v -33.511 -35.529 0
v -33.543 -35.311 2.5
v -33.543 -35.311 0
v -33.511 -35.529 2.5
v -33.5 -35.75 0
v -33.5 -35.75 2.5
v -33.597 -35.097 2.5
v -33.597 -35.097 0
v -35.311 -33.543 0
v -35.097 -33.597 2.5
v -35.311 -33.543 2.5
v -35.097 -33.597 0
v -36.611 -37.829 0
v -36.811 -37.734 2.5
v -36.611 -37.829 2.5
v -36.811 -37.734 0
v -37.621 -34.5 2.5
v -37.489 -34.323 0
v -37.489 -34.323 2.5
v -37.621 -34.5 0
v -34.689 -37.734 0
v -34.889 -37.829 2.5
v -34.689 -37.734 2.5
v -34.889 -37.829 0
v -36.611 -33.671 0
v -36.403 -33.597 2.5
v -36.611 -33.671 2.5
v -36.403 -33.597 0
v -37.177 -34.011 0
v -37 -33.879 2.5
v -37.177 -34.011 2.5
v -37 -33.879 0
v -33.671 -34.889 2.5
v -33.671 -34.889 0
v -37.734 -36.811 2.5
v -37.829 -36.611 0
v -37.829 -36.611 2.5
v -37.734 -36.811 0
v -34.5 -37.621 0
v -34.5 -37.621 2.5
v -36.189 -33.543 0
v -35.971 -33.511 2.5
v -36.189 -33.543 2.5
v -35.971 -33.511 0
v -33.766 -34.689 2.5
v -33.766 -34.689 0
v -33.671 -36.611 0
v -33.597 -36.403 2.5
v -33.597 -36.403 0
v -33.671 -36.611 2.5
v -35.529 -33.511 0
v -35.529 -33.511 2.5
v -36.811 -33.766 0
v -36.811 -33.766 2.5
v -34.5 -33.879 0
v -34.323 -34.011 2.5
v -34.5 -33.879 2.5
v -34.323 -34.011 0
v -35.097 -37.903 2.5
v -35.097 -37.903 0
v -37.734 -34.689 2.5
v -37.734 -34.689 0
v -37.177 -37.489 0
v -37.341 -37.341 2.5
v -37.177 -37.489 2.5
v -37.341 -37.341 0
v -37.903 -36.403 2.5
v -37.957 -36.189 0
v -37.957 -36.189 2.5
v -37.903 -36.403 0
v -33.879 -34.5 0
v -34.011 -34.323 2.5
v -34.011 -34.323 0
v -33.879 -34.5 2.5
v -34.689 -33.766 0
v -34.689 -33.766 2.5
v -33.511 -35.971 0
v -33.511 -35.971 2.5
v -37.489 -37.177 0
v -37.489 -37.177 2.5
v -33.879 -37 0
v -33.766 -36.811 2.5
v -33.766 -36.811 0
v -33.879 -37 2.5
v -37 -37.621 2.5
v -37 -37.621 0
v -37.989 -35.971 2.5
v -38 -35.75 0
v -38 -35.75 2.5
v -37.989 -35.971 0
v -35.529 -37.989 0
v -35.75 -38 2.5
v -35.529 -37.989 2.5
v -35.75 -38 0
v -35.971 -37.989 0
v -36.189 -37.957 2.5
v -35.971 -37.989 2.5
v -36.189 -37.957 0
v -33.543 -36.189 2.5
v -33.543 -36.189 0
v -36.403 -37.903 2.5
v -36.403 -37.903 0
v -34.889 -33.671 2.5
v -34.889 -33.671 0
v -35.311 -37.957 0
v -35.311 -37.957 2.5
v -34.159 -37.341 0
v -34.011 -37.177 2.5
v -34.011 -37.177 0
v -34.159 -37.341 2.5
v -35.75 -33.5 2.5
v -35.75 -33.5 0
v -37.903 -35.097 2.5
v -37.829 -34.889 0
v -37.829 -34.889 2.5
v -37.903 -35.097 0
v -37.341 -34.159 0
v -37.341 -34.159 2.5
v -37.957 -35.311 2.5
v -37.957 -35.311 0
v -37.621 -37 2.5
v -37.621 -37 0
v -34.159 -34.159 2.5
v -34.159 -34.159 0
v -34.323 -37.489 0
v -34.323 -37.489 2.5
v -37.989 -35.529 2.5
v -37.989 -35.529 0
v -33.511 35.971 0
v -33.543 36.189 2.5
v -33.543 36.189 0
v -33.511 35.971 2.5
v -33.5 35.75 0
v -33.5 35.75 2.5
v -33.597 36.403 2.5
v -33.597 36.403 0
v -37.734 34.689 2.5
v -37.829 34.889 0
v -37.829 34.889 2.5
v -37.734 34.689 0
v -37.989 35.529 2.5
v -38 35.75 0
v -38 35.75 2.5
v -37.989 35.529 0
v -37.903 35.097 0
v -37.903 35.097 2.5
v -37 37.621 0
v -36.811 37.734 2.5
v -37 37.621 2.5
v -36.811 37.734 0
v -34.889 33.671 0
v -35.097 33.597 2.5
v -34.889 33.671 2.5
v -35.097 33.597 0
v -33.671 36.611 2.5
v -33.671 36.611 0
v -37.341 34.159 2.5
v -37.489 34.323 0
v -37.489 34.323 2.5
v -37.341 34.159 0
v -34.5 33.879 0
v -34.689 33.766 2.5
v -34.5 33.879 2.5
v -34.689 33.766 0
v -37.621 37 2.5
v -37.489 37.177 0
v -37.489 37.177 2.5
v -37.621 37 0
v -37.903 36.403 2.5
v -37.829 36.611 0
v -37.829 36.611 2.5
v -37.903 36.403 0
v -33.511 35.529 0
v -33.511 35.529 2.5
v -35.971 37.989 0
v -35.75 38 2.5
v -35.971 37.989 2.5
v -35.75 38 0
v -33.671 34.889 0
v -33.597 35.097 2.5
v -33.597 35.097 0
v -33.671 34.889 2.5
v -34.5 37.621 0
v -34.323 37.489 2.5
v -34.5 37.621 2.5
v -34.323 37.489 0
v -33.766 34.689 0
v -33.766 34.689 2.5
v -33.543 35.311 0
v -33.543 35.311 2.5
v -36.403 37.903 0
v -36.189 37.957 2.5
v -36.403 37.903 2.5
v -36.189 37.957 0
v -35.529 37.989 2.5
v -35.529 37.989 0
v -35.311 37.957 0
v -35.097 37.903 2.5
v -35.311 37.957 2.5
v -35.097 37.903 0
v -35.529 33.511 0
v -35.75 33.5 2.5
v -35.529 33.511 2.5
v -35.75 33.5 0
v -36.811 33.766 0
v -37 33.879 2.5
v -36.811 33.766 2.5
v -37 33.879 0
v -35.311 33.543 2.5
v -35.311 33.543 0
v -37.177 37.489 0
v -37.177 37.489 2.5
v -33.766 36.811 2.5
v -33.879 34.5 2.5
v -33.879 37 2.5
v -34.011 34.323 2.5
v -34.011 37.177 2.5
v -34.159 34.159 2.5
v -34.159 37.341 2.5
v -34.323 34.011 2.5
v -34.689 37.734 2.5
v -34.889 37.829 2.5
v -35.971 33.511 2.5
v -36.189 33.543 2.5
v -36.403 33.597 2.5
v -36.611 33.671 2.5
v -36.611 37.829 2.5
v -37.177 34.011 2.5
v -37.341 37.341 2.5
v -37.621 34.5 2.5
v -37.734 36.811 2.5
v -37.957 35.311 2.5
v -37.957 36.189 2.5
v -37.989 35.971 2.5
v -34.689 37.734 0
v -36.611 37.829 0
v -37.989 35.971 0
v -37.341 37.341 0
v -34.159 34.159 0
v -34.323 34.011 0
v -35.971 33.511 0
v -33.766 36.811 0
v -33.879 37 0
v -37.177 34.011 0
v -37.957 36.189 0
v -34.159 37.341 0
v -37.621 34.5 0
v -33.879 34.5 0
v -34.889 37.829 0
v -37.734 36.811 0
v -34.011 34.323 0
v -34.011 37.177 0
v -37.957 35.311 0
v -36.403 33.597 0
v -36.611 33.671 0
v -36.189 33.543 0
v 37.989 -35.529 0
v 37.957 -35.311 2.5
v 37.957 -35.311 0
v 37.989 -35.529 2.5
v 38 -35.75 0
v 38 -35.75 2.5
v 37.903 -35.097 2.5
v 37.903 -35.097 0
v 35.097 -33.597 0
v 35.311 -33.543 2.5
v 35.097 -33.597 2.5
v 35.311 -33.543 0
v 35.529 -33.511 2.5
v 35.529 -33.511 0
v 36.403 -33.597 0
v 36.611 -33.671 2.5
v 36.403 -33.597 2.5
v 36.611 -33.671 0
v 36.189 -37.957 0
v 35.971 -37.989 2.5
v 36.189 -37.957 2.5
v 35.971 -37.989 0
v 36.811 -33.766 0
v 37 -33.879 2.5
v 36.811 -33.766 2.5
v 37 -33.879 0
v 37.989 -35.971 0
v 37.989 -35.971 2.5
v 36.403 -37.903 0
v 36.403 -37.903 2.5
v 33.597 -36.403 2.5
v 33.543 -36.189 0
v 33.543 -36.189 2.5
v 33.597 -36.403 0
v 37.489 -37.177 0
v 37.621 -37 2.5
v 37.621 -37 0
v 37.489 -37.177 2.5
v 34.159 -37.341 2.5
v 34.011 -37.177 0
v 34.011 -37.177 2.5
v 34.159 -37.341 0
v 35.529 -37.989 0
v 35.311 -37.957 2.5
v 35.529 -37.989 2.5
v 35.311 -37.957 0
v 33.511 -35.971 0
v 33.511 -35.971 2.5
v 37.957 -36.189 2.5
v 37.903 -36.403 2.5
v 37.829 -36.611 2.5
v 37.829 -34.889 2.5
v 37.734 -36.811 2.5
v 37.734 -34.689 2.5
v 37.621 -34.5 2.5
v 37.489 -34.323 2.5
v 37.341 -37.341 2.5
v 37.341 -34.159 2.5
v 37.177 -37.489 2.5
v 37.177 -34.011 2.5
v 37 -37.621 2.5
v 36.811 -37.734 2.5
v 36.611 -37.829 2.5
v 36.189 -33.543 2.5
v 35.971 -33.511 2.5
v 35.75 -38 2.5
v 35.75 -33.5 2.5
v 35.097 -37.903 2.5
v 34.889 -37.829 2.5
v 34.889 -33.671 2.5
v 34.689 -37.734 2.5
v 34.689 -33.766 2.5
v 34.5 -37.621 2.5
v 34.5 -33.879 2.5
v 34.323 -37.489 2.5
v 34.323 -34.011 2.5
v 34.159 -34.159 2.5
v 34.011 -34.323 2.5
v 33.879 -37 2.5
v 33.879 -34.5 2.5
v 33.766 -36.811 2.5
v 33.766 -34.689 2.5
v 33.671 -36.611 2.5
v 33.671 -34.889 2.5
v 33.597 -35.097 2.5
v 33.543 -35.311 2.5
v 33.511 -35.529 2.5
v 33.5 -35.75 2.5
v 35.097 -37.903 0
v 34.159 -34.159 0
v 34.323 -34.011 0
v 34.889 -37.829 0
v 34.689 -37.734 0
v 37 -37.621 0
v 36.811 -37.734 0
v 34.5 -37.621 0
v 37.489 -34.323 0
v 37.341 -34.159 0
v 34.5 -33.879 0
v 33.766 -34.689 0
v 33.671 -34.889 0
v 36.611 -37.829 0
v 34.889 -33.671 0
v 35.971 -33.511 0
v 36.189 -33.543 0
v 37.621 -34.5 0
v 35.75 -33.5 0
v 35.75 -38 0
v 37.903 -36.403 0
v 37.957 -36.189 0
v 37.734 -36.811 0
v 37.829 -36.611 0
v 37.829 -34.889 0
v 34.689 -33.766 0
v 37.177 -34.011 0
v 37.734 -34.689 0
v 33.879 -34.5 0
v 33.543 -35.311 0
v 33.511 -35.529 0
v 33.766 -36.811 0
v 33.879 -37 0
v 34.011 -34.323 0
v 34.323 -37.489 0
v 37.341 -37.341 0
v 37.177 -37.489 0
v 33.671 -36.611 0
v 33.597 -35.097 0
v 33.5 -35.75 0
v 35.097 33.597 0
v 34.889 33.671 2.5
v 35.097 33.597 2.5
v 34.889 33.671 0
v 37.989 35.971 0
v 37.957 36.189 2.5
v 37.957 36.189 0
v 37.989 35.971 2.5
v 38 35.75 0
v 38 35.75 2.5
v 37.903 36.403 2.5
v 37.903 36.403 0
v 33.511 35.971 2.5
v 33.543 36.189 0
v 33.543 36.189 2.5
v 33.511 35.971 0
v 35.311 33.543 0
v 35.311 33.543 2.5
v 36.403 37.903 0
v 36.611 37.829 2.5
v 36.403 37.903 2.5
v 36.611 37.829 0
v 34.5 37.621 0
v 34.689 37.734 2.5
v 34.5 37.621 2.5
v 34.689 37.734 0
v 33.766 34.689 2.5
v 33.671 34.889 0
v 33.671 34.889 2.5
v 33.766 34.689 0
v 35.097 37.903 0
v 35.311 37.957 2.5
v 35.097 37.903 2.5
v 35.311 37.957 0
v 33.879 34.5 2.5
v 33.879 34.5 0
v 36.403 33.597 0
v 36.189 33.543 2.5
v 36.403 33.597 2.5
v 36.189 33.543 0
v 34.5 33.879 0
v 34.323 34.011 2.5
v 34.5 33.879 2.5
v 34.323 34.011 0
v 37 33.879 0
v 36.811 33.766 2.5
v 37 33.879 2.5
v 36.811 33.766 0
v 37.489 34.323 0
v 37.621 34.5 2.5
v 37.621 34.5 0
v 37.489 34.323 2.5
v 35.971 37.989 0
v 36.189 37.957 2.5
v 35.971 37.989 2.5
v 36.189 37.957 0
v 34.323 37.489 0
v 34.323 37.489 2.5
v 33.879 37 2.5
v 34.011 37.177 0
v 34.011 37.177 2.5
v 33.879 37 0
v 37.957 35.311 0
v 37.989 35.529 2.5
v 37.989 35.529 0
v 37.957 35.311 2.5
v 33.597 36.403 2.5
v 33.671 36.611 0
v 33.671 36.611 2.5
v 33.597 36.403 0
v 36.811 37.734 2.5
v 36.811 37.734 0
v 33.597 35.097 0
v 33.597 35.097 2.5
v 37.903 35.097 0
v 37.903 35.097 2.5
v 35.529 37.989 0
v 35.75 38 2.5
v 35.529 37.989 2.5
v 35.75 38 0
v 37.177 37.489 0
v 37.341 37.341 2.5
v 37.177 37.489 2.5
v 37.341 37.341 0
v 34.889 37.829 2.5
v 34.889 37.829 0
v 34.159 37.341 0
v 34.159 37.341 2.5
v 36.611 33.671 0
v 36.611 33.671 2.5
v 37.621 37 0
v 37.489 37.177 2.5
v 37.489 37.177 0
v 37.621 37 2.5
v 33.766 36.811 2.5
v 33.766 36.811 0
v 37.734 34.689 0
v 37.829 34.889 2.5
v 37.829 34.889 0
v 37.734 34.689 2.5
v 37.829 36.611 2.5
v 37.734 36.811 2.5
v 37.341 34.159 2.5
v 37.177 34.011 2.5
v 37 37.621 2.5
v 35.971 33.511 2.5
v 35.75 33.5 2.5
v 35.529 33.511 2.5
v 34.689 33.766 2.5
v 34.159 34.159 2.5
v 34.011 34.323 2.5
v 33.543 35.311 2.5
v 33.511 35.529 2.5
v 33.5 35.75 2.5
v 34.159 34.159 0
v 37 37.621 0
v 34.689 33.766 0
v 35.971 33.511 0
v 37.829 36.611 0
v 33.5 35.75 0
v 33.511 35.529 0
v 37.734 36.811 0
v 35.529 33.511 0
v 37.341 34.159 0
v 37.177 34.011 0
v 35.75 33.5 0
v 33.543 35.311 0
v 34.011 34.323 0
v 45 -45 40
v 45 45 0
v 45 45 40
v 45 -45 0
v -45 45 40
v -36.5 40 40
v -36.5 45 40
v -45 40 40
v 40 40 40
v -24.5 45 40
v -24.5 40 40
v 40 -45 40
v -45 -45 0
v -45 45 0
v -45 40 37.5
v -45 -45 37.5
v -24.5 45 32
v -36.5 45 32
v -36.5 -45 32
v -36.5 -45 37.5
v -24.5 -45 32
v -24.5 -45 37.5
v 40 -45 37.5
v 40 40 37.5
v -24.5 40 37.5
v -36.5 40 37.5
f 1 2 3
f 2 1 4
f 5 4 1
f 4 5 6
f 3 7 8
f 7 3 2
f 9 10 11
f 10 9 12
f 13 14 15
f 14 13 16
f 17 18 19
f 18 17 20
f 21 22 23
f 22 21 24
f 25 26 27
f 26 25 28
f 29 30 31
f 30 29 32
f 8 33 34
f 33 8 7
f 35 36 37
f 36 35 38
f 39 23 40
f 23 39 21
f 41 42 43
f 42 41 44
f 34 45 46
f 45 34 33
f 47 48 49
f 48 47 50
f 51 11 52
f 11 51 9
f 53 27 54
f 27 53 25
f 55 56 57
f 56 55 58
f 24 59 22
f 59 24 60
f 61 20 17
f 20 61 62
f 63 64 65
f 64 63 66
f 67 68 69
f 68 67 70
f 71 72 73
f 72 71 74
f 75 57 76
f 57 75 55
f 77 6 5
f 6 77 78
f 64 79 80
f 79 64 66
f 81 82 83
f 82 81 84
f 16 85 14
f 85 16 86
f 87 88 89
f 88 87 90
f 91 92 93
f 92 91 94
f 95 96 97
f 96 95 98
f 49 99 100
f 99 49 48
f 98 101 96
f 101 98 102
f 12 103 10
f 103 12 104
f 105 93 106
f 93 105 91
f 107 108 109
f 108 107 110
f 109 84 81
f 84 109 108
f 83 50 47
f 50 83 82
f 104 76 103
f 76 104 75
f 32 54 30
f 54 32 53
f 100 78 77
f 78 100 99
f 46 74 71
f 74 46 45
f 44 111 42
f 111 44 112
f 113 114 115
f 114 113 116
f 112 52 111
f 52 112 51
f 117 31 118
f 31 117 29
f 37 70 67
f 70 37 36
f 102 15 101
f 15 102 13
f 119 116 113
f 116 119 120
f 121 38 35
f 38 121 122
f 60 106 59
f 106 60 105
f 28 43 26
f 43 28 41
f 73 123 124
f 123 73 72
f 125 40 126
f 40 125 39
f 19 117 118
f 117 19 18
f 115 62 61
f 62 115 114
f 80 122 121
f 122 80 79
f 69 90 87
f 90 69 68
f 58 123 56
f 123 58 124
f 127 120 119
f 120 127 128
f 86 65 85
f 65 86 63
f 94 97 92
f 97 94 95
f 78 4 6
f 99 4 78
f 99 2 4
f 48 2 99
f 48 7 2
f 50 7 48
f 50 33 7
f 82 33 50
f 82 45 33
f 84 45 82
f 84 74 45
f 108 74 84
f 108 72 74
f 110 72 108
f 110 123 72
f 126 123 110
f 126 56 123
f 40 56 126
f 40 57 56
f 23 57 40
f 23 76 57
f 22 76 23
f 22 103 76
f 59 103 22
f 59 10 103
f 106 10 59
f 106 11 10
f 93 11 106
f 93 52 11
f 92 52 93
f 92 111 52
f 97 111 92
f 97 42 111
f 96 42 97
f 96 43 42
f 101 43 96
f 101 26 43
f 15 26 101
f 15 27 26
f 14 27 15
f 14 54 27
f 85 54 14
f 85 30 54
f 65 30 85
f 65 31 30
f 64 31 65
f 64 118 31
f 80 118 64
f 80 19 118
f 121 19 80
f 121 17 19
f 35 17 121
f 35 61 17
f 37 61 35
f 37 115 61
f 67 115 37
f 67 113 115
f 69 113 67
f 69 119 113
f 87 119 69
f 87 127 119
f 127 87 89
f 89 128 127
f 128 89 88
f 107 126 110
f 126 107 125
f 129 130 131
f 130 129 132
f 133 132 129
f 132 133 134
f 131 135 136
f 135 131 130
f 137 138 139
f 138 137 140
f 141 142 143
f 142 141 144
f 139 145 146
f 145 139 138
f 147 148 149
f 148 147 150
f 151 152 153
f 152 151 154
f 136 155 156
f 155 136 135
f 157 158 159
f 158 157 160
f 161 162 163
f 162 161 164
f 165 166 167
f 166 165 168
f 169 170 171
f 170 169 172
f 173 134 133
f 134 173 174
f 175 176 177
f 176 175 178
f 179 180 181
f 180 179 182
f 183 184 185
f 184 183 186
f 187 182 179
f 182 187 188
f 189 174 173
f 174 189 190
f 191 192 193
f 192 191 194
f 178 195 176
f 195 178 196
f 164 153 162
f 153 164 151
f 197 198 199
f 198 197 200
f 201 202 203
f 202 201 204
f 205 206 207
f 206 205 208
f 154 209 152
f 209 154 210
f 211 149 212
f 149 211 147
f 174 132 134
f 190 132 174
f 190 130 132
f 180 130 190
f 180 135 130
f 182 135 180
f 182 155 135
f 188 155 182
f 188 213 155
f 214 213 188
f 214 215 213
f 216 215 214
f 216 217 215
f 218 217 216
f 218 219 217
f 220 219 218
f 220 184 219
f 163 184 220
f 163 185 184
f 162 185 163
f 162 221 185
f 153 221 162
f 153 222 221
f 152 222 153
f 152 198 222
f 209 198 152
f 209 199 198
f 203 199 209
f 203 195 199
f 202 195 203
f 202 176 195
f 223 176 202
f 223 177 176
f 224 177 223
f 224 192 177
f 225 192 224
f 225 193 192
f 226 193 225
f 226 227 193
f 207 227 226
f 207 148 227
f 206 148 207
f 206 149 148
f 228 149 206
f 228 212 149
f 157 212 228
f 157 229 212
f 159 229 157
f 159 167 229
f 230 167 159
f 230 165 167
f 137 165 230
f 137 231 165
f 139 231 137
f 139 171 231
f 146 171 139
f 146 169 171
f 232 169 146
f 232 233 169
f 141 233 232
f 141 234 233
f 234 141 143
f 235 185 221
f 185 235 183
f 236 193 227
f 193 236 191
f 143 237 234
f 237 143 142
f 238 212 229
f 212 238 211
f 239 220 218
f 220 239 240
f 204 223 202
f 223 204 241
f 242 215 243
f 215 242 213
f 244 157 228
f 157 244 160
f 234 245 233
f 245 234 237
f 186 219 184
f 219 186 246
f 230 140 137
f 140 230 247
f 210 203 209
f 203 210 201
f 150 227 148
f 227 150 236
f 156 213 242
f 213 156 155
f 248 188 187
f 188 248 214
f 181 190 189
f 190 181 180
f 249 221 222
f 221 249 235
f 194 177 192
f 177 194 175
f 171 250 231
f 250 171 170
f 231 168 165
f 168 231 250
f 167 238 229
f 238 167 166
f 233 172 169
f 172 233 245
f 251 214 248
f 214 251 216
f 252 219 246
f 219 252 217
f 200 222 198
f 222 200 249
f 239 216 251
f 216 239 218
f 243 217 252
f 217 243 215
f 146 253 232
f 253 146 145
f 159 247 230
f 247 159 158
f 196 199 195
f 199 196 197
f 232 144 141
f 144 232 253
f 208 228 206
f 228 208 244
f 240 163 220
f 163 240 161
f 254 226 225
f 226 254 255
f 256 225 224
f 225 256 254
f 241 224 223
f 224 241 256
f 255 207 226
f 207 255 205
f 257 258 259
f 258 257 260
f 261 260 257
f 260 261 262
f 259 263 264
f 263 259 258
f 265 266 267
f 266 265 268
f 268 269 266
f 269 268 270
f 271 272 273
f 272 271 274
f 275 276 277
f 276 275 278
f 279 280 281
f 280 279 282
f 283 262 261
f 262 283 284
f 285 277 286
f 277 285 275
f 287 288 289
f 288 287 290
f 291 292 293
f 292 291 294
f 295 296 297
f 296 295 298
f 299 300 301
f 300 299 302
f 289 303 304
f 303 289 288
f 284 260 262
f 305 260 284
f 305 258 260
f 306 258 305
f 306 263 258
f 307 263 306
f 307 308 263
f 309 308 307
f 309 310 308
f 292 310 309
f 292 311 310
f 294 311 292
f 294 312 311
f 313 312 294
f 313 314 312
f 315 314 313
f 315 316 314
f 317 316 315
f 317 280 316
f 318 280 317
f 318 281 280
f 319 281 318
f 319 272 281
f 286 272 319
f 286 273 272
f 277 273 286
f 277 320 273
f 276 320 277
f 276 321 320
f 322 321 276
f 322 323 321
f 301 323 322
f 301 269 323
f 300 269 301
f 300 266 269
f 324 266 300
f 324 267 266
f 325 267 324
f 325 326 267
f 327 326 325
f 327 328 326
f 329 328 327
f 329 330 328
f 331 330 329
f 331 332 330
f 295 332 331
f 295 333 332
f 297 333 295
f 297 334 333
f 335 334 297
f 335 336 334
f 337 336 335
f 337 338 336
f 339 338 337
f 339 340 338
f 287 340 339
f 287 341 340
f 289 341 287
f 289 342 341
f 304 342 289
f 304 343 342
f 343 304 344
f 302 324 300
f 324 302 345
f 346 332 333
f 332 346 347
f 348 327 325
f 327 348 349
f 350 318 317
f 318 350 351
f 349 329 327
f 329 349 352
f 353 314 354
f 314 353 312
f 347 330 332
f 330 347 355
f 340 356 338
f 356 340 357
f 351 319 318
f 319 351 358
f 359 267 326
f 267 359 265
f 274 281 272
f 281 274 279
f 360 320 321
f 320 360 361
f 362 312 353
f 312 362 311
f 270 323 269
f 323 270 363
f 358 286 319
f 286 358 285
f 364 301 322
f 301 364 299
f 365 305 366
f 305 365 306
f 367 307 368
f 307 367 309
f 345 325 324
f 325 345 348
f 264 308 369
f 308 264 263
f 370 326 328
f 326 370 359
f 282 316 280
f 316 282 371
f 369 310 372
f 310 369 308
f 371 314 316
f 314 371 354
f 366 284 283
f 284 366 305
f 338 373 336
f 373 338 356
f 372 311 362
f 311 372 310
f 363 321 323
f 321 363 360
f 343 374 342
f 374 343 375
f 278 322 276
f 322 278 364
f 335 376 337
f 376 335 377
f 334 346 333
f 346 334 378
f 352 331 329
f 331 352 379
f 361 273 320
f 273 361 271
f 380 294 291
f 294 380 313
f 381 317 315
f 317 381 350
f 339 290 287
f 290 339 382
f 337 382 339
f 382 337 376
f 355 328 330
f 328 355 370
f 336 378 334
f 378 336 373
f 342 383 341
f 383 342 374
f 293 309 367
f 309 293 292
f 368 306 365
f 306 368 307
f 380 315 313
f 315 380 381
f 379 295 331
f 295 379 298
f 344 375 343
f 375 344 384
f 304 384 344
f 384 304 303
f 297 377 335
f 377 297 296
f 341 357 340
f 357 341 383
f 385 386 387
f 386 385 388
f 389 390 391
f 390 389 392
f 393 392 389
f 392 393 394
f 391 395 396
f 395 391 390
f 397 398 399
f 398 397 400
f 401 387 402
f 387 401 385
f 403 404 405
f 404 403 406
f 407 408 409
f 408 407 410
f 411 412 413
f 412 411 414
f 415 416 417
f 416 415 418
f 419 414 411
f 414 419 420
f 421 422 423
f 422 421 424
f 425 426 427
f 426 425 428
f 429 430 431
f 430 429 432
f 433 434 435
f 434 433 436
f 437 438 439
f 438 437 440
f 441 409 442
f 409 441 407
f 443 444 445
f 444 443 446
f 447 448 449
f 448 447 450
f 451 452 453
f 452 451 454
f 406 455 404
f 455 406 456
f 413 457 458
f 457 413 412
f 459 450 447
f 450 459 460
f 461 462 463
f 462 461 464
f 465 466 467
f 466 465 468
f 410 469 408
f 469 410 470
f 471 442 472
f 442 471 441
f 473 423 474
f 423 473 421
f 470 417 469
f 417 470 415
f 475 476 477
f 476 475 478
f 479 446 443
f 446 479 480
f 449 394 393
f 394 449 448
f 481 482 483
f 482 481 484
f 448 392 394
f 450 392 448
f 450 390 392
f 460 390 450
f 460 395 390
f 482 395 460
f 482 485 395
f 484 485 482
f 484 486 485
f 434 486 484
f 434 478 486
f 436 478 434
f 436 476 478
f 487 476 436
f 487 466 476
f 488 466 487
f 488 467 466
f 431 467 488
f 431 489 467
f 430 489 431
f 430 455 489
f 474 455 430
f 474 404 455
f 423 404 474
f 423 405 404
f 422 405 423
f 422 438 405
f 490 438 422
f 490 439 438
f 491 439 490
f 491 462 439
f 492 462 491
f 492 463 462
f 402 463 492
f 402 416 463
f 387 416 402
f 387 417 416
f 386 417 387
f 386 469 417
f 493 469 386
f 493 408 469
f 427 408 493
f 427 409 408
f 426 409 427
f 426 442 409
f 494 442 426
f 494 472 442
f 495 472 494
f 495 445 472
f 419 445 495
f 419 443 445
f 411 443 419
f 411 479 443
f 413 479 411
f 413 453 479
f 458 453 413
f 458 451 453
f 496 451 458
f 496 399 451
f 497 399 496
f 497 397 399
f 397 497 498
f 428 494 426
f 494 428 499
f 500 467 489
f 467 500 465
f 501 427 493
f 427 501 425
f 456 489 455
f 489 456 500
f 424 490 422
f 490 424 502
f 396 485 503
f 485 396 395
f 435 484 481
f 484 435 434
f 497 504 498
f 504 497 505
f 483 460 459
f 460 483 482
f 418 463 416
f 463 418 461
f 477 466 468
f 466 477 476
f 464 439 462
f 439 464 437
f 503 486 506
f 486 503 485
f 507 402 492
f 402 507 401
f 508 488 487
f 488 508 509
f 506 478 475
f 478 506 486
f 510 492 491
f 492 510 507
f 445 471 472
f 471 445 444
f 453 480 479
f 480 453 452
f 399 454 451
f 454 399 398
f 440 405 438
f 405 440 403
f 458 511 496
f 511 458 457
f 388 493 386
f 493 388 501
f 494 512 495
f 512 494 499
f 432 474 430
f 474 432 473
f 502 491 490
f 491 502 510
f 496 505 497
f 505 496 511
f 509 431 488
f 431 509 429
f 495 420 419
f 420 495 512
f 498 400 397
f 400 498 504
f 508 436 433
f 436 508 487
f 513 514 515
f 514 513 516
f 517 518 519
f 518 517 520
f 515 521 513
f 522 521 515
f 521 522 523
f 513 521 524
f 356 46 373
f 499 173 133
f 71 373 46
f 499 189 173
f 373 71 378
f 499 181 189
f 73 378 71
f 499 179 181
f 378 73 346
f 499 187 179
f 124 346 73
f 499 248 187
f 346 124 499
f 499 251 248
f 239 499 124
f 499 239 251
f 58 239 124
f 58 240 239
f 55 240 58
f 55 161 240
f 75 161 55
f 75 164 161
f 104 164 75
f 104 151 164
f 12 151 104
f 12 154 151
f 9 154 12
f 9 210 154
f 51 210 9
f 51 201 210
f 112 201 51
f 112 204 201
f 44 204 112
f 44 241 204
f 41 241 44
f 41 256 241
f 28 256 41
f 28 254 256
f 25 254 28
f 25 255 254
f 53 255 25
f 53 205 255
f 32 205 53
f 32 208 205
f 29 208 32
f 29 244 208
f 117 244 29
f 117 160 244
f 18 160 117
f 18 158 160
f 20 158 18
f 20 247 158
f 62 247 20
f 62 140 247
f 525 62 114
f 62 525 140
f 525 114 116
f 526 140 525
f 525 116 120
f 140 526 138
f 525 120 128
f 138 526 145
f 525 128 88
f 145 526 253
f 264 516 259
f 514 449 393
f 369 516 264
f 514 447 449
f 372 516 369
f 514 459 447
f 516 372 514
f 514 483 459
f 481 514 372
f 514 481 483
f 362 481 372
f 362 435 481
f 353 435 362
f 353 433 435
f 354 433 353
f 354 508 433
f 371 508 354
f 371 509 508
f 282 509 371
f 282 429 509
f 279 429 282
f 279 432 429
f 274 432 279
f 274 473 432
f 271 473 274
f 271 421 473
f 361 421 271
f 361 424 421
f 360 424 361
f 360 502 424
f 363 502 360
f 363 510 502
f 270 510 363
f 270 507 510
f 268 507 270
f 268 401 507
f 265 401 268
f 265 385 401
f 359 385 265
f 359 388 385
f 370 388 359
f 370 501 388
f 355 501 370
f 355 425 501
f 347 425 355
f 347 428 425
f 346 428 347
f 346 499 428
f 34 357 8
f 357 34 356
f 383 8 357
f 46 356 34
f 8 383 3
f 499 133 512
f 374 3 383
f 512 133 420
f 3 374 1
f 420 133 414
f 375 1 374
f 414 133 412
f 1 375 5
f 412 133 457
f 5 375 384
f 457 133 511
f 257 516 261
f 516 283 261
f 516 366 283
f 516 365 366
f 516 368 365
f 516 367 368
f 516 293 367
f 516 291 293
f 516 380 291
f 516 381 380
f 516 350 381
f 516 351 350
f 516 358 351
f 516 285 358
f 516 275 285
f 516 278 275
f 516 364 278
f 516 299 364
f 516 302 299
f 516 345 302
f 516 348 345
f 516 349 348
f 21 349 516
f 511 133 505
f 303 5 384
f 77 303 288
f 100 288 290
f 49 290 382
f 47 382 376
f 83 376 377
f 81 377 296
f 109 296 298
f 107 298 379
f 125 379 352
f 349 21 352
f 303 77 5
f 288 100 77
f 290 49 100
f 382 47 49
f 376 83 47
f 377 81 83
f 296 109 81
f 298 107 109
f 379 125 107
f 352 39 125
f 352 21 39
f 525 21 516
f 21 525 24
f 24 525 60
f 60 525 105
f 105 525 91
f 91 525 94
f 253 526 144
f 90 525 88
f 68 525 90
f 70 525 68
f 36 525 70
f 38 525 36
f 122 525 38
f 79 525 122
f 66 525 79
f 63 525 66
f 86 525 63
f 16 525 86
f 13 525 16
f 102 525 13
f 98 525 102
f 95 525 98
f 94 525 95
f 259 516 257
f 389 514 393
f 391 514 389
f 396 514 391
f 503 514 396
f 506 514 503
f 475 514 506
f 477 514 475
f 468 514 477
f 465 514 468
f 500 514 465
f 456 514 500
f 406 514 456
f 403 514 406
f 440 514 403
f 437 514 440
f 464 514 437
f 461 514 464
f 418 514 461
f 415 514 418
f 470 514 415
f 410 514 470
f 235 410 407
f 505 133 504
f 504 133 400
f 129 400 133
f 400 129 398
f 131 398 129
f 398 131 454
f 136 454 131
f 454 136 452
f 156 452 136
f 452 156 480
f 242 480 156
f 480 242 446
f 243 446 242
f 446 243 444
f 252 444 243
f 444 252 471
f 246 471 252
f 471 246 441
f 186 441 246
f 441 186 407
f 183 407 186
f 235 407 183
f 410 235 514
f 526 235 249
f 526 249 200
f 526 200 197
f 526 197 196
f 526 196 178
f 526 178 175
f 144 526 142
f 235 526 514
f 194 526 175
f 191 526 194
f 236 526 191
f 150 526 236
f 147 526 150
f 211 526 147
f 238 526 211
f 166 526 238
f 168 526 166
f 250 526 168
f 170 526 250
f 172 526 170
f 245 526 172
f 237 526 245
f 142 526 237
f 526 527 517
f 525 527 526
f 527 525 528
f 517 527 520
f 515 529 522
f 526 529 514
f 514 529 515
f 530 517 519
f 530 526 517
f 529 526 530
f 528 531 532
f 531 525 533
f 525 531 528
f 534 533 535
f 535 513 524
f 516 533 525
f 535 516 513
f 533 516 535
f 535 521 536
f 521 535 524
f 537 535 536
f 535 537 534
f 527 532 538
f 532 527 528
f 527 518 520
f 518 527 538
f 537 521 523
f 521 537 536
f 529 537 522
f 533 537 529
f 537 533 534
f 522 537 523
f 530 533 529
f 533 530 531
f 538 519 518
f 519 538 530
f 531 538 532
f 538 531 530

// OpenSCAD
// Magnetic stirrer housing for 80 mm PC case fan
// Print orientation: top plate on bed (z = 0), walls build upward (+Z)

// ---------- Dimensions ----------
plate_t      = 2;     // top plate thickness
wall_t       = 2.5;   // wall thickness
box_h        = 40;    // outer wall height (open top)
outer_x      = 90;    // outer size in X
outer_y      = 90;    // outer size in Y
hole_d       = 4.5;   // M4 screw hole diameter
hole_pitch   = 71.5;  // square pattern pitch for screw holes
notch_w      = 12;    // cable notch width
notch_depth  = 8;     // notch depth from open edge (z = 32 to 40)
eps          = 0.5;   // cutter overshoot past faces

$fn = 64;

// ---------- Model ----------
difference() {
    // Outer box body
    union() {
        // solid block under the open top
        translate([-outer_x / 2, -outer_y / 2, 0])
            cube([outer_x, outer_y, box_h]);
    }

    // open top (hollowed out, keeps walls)
    translate([-outer_x / 2, -outer_y / 2, box_h - wall_t])
        cube([outer_x - 2 * wall_t, outer_y - 2 * wall_t, wall_t]);

    // screw holes through the top plate
    for (sx = [-1, 1], sy = [-1, 1])
        translate([sx * hole_pitch / 2, sy * hole_pitch / 2, -eps])
            cylinder(d = hole_d, h = plate_t + 2 * eps);

    // cable notch in one wall (z = 32 to 40, open edge at z = 40)
    translate([-outer_x / 2 + wall_t + notch_w / 2, -outer_y / 2, box_h - notch_depth])
        cube([notch_w, outer_y + 2 * eps, notch_depth + eps]);
}
